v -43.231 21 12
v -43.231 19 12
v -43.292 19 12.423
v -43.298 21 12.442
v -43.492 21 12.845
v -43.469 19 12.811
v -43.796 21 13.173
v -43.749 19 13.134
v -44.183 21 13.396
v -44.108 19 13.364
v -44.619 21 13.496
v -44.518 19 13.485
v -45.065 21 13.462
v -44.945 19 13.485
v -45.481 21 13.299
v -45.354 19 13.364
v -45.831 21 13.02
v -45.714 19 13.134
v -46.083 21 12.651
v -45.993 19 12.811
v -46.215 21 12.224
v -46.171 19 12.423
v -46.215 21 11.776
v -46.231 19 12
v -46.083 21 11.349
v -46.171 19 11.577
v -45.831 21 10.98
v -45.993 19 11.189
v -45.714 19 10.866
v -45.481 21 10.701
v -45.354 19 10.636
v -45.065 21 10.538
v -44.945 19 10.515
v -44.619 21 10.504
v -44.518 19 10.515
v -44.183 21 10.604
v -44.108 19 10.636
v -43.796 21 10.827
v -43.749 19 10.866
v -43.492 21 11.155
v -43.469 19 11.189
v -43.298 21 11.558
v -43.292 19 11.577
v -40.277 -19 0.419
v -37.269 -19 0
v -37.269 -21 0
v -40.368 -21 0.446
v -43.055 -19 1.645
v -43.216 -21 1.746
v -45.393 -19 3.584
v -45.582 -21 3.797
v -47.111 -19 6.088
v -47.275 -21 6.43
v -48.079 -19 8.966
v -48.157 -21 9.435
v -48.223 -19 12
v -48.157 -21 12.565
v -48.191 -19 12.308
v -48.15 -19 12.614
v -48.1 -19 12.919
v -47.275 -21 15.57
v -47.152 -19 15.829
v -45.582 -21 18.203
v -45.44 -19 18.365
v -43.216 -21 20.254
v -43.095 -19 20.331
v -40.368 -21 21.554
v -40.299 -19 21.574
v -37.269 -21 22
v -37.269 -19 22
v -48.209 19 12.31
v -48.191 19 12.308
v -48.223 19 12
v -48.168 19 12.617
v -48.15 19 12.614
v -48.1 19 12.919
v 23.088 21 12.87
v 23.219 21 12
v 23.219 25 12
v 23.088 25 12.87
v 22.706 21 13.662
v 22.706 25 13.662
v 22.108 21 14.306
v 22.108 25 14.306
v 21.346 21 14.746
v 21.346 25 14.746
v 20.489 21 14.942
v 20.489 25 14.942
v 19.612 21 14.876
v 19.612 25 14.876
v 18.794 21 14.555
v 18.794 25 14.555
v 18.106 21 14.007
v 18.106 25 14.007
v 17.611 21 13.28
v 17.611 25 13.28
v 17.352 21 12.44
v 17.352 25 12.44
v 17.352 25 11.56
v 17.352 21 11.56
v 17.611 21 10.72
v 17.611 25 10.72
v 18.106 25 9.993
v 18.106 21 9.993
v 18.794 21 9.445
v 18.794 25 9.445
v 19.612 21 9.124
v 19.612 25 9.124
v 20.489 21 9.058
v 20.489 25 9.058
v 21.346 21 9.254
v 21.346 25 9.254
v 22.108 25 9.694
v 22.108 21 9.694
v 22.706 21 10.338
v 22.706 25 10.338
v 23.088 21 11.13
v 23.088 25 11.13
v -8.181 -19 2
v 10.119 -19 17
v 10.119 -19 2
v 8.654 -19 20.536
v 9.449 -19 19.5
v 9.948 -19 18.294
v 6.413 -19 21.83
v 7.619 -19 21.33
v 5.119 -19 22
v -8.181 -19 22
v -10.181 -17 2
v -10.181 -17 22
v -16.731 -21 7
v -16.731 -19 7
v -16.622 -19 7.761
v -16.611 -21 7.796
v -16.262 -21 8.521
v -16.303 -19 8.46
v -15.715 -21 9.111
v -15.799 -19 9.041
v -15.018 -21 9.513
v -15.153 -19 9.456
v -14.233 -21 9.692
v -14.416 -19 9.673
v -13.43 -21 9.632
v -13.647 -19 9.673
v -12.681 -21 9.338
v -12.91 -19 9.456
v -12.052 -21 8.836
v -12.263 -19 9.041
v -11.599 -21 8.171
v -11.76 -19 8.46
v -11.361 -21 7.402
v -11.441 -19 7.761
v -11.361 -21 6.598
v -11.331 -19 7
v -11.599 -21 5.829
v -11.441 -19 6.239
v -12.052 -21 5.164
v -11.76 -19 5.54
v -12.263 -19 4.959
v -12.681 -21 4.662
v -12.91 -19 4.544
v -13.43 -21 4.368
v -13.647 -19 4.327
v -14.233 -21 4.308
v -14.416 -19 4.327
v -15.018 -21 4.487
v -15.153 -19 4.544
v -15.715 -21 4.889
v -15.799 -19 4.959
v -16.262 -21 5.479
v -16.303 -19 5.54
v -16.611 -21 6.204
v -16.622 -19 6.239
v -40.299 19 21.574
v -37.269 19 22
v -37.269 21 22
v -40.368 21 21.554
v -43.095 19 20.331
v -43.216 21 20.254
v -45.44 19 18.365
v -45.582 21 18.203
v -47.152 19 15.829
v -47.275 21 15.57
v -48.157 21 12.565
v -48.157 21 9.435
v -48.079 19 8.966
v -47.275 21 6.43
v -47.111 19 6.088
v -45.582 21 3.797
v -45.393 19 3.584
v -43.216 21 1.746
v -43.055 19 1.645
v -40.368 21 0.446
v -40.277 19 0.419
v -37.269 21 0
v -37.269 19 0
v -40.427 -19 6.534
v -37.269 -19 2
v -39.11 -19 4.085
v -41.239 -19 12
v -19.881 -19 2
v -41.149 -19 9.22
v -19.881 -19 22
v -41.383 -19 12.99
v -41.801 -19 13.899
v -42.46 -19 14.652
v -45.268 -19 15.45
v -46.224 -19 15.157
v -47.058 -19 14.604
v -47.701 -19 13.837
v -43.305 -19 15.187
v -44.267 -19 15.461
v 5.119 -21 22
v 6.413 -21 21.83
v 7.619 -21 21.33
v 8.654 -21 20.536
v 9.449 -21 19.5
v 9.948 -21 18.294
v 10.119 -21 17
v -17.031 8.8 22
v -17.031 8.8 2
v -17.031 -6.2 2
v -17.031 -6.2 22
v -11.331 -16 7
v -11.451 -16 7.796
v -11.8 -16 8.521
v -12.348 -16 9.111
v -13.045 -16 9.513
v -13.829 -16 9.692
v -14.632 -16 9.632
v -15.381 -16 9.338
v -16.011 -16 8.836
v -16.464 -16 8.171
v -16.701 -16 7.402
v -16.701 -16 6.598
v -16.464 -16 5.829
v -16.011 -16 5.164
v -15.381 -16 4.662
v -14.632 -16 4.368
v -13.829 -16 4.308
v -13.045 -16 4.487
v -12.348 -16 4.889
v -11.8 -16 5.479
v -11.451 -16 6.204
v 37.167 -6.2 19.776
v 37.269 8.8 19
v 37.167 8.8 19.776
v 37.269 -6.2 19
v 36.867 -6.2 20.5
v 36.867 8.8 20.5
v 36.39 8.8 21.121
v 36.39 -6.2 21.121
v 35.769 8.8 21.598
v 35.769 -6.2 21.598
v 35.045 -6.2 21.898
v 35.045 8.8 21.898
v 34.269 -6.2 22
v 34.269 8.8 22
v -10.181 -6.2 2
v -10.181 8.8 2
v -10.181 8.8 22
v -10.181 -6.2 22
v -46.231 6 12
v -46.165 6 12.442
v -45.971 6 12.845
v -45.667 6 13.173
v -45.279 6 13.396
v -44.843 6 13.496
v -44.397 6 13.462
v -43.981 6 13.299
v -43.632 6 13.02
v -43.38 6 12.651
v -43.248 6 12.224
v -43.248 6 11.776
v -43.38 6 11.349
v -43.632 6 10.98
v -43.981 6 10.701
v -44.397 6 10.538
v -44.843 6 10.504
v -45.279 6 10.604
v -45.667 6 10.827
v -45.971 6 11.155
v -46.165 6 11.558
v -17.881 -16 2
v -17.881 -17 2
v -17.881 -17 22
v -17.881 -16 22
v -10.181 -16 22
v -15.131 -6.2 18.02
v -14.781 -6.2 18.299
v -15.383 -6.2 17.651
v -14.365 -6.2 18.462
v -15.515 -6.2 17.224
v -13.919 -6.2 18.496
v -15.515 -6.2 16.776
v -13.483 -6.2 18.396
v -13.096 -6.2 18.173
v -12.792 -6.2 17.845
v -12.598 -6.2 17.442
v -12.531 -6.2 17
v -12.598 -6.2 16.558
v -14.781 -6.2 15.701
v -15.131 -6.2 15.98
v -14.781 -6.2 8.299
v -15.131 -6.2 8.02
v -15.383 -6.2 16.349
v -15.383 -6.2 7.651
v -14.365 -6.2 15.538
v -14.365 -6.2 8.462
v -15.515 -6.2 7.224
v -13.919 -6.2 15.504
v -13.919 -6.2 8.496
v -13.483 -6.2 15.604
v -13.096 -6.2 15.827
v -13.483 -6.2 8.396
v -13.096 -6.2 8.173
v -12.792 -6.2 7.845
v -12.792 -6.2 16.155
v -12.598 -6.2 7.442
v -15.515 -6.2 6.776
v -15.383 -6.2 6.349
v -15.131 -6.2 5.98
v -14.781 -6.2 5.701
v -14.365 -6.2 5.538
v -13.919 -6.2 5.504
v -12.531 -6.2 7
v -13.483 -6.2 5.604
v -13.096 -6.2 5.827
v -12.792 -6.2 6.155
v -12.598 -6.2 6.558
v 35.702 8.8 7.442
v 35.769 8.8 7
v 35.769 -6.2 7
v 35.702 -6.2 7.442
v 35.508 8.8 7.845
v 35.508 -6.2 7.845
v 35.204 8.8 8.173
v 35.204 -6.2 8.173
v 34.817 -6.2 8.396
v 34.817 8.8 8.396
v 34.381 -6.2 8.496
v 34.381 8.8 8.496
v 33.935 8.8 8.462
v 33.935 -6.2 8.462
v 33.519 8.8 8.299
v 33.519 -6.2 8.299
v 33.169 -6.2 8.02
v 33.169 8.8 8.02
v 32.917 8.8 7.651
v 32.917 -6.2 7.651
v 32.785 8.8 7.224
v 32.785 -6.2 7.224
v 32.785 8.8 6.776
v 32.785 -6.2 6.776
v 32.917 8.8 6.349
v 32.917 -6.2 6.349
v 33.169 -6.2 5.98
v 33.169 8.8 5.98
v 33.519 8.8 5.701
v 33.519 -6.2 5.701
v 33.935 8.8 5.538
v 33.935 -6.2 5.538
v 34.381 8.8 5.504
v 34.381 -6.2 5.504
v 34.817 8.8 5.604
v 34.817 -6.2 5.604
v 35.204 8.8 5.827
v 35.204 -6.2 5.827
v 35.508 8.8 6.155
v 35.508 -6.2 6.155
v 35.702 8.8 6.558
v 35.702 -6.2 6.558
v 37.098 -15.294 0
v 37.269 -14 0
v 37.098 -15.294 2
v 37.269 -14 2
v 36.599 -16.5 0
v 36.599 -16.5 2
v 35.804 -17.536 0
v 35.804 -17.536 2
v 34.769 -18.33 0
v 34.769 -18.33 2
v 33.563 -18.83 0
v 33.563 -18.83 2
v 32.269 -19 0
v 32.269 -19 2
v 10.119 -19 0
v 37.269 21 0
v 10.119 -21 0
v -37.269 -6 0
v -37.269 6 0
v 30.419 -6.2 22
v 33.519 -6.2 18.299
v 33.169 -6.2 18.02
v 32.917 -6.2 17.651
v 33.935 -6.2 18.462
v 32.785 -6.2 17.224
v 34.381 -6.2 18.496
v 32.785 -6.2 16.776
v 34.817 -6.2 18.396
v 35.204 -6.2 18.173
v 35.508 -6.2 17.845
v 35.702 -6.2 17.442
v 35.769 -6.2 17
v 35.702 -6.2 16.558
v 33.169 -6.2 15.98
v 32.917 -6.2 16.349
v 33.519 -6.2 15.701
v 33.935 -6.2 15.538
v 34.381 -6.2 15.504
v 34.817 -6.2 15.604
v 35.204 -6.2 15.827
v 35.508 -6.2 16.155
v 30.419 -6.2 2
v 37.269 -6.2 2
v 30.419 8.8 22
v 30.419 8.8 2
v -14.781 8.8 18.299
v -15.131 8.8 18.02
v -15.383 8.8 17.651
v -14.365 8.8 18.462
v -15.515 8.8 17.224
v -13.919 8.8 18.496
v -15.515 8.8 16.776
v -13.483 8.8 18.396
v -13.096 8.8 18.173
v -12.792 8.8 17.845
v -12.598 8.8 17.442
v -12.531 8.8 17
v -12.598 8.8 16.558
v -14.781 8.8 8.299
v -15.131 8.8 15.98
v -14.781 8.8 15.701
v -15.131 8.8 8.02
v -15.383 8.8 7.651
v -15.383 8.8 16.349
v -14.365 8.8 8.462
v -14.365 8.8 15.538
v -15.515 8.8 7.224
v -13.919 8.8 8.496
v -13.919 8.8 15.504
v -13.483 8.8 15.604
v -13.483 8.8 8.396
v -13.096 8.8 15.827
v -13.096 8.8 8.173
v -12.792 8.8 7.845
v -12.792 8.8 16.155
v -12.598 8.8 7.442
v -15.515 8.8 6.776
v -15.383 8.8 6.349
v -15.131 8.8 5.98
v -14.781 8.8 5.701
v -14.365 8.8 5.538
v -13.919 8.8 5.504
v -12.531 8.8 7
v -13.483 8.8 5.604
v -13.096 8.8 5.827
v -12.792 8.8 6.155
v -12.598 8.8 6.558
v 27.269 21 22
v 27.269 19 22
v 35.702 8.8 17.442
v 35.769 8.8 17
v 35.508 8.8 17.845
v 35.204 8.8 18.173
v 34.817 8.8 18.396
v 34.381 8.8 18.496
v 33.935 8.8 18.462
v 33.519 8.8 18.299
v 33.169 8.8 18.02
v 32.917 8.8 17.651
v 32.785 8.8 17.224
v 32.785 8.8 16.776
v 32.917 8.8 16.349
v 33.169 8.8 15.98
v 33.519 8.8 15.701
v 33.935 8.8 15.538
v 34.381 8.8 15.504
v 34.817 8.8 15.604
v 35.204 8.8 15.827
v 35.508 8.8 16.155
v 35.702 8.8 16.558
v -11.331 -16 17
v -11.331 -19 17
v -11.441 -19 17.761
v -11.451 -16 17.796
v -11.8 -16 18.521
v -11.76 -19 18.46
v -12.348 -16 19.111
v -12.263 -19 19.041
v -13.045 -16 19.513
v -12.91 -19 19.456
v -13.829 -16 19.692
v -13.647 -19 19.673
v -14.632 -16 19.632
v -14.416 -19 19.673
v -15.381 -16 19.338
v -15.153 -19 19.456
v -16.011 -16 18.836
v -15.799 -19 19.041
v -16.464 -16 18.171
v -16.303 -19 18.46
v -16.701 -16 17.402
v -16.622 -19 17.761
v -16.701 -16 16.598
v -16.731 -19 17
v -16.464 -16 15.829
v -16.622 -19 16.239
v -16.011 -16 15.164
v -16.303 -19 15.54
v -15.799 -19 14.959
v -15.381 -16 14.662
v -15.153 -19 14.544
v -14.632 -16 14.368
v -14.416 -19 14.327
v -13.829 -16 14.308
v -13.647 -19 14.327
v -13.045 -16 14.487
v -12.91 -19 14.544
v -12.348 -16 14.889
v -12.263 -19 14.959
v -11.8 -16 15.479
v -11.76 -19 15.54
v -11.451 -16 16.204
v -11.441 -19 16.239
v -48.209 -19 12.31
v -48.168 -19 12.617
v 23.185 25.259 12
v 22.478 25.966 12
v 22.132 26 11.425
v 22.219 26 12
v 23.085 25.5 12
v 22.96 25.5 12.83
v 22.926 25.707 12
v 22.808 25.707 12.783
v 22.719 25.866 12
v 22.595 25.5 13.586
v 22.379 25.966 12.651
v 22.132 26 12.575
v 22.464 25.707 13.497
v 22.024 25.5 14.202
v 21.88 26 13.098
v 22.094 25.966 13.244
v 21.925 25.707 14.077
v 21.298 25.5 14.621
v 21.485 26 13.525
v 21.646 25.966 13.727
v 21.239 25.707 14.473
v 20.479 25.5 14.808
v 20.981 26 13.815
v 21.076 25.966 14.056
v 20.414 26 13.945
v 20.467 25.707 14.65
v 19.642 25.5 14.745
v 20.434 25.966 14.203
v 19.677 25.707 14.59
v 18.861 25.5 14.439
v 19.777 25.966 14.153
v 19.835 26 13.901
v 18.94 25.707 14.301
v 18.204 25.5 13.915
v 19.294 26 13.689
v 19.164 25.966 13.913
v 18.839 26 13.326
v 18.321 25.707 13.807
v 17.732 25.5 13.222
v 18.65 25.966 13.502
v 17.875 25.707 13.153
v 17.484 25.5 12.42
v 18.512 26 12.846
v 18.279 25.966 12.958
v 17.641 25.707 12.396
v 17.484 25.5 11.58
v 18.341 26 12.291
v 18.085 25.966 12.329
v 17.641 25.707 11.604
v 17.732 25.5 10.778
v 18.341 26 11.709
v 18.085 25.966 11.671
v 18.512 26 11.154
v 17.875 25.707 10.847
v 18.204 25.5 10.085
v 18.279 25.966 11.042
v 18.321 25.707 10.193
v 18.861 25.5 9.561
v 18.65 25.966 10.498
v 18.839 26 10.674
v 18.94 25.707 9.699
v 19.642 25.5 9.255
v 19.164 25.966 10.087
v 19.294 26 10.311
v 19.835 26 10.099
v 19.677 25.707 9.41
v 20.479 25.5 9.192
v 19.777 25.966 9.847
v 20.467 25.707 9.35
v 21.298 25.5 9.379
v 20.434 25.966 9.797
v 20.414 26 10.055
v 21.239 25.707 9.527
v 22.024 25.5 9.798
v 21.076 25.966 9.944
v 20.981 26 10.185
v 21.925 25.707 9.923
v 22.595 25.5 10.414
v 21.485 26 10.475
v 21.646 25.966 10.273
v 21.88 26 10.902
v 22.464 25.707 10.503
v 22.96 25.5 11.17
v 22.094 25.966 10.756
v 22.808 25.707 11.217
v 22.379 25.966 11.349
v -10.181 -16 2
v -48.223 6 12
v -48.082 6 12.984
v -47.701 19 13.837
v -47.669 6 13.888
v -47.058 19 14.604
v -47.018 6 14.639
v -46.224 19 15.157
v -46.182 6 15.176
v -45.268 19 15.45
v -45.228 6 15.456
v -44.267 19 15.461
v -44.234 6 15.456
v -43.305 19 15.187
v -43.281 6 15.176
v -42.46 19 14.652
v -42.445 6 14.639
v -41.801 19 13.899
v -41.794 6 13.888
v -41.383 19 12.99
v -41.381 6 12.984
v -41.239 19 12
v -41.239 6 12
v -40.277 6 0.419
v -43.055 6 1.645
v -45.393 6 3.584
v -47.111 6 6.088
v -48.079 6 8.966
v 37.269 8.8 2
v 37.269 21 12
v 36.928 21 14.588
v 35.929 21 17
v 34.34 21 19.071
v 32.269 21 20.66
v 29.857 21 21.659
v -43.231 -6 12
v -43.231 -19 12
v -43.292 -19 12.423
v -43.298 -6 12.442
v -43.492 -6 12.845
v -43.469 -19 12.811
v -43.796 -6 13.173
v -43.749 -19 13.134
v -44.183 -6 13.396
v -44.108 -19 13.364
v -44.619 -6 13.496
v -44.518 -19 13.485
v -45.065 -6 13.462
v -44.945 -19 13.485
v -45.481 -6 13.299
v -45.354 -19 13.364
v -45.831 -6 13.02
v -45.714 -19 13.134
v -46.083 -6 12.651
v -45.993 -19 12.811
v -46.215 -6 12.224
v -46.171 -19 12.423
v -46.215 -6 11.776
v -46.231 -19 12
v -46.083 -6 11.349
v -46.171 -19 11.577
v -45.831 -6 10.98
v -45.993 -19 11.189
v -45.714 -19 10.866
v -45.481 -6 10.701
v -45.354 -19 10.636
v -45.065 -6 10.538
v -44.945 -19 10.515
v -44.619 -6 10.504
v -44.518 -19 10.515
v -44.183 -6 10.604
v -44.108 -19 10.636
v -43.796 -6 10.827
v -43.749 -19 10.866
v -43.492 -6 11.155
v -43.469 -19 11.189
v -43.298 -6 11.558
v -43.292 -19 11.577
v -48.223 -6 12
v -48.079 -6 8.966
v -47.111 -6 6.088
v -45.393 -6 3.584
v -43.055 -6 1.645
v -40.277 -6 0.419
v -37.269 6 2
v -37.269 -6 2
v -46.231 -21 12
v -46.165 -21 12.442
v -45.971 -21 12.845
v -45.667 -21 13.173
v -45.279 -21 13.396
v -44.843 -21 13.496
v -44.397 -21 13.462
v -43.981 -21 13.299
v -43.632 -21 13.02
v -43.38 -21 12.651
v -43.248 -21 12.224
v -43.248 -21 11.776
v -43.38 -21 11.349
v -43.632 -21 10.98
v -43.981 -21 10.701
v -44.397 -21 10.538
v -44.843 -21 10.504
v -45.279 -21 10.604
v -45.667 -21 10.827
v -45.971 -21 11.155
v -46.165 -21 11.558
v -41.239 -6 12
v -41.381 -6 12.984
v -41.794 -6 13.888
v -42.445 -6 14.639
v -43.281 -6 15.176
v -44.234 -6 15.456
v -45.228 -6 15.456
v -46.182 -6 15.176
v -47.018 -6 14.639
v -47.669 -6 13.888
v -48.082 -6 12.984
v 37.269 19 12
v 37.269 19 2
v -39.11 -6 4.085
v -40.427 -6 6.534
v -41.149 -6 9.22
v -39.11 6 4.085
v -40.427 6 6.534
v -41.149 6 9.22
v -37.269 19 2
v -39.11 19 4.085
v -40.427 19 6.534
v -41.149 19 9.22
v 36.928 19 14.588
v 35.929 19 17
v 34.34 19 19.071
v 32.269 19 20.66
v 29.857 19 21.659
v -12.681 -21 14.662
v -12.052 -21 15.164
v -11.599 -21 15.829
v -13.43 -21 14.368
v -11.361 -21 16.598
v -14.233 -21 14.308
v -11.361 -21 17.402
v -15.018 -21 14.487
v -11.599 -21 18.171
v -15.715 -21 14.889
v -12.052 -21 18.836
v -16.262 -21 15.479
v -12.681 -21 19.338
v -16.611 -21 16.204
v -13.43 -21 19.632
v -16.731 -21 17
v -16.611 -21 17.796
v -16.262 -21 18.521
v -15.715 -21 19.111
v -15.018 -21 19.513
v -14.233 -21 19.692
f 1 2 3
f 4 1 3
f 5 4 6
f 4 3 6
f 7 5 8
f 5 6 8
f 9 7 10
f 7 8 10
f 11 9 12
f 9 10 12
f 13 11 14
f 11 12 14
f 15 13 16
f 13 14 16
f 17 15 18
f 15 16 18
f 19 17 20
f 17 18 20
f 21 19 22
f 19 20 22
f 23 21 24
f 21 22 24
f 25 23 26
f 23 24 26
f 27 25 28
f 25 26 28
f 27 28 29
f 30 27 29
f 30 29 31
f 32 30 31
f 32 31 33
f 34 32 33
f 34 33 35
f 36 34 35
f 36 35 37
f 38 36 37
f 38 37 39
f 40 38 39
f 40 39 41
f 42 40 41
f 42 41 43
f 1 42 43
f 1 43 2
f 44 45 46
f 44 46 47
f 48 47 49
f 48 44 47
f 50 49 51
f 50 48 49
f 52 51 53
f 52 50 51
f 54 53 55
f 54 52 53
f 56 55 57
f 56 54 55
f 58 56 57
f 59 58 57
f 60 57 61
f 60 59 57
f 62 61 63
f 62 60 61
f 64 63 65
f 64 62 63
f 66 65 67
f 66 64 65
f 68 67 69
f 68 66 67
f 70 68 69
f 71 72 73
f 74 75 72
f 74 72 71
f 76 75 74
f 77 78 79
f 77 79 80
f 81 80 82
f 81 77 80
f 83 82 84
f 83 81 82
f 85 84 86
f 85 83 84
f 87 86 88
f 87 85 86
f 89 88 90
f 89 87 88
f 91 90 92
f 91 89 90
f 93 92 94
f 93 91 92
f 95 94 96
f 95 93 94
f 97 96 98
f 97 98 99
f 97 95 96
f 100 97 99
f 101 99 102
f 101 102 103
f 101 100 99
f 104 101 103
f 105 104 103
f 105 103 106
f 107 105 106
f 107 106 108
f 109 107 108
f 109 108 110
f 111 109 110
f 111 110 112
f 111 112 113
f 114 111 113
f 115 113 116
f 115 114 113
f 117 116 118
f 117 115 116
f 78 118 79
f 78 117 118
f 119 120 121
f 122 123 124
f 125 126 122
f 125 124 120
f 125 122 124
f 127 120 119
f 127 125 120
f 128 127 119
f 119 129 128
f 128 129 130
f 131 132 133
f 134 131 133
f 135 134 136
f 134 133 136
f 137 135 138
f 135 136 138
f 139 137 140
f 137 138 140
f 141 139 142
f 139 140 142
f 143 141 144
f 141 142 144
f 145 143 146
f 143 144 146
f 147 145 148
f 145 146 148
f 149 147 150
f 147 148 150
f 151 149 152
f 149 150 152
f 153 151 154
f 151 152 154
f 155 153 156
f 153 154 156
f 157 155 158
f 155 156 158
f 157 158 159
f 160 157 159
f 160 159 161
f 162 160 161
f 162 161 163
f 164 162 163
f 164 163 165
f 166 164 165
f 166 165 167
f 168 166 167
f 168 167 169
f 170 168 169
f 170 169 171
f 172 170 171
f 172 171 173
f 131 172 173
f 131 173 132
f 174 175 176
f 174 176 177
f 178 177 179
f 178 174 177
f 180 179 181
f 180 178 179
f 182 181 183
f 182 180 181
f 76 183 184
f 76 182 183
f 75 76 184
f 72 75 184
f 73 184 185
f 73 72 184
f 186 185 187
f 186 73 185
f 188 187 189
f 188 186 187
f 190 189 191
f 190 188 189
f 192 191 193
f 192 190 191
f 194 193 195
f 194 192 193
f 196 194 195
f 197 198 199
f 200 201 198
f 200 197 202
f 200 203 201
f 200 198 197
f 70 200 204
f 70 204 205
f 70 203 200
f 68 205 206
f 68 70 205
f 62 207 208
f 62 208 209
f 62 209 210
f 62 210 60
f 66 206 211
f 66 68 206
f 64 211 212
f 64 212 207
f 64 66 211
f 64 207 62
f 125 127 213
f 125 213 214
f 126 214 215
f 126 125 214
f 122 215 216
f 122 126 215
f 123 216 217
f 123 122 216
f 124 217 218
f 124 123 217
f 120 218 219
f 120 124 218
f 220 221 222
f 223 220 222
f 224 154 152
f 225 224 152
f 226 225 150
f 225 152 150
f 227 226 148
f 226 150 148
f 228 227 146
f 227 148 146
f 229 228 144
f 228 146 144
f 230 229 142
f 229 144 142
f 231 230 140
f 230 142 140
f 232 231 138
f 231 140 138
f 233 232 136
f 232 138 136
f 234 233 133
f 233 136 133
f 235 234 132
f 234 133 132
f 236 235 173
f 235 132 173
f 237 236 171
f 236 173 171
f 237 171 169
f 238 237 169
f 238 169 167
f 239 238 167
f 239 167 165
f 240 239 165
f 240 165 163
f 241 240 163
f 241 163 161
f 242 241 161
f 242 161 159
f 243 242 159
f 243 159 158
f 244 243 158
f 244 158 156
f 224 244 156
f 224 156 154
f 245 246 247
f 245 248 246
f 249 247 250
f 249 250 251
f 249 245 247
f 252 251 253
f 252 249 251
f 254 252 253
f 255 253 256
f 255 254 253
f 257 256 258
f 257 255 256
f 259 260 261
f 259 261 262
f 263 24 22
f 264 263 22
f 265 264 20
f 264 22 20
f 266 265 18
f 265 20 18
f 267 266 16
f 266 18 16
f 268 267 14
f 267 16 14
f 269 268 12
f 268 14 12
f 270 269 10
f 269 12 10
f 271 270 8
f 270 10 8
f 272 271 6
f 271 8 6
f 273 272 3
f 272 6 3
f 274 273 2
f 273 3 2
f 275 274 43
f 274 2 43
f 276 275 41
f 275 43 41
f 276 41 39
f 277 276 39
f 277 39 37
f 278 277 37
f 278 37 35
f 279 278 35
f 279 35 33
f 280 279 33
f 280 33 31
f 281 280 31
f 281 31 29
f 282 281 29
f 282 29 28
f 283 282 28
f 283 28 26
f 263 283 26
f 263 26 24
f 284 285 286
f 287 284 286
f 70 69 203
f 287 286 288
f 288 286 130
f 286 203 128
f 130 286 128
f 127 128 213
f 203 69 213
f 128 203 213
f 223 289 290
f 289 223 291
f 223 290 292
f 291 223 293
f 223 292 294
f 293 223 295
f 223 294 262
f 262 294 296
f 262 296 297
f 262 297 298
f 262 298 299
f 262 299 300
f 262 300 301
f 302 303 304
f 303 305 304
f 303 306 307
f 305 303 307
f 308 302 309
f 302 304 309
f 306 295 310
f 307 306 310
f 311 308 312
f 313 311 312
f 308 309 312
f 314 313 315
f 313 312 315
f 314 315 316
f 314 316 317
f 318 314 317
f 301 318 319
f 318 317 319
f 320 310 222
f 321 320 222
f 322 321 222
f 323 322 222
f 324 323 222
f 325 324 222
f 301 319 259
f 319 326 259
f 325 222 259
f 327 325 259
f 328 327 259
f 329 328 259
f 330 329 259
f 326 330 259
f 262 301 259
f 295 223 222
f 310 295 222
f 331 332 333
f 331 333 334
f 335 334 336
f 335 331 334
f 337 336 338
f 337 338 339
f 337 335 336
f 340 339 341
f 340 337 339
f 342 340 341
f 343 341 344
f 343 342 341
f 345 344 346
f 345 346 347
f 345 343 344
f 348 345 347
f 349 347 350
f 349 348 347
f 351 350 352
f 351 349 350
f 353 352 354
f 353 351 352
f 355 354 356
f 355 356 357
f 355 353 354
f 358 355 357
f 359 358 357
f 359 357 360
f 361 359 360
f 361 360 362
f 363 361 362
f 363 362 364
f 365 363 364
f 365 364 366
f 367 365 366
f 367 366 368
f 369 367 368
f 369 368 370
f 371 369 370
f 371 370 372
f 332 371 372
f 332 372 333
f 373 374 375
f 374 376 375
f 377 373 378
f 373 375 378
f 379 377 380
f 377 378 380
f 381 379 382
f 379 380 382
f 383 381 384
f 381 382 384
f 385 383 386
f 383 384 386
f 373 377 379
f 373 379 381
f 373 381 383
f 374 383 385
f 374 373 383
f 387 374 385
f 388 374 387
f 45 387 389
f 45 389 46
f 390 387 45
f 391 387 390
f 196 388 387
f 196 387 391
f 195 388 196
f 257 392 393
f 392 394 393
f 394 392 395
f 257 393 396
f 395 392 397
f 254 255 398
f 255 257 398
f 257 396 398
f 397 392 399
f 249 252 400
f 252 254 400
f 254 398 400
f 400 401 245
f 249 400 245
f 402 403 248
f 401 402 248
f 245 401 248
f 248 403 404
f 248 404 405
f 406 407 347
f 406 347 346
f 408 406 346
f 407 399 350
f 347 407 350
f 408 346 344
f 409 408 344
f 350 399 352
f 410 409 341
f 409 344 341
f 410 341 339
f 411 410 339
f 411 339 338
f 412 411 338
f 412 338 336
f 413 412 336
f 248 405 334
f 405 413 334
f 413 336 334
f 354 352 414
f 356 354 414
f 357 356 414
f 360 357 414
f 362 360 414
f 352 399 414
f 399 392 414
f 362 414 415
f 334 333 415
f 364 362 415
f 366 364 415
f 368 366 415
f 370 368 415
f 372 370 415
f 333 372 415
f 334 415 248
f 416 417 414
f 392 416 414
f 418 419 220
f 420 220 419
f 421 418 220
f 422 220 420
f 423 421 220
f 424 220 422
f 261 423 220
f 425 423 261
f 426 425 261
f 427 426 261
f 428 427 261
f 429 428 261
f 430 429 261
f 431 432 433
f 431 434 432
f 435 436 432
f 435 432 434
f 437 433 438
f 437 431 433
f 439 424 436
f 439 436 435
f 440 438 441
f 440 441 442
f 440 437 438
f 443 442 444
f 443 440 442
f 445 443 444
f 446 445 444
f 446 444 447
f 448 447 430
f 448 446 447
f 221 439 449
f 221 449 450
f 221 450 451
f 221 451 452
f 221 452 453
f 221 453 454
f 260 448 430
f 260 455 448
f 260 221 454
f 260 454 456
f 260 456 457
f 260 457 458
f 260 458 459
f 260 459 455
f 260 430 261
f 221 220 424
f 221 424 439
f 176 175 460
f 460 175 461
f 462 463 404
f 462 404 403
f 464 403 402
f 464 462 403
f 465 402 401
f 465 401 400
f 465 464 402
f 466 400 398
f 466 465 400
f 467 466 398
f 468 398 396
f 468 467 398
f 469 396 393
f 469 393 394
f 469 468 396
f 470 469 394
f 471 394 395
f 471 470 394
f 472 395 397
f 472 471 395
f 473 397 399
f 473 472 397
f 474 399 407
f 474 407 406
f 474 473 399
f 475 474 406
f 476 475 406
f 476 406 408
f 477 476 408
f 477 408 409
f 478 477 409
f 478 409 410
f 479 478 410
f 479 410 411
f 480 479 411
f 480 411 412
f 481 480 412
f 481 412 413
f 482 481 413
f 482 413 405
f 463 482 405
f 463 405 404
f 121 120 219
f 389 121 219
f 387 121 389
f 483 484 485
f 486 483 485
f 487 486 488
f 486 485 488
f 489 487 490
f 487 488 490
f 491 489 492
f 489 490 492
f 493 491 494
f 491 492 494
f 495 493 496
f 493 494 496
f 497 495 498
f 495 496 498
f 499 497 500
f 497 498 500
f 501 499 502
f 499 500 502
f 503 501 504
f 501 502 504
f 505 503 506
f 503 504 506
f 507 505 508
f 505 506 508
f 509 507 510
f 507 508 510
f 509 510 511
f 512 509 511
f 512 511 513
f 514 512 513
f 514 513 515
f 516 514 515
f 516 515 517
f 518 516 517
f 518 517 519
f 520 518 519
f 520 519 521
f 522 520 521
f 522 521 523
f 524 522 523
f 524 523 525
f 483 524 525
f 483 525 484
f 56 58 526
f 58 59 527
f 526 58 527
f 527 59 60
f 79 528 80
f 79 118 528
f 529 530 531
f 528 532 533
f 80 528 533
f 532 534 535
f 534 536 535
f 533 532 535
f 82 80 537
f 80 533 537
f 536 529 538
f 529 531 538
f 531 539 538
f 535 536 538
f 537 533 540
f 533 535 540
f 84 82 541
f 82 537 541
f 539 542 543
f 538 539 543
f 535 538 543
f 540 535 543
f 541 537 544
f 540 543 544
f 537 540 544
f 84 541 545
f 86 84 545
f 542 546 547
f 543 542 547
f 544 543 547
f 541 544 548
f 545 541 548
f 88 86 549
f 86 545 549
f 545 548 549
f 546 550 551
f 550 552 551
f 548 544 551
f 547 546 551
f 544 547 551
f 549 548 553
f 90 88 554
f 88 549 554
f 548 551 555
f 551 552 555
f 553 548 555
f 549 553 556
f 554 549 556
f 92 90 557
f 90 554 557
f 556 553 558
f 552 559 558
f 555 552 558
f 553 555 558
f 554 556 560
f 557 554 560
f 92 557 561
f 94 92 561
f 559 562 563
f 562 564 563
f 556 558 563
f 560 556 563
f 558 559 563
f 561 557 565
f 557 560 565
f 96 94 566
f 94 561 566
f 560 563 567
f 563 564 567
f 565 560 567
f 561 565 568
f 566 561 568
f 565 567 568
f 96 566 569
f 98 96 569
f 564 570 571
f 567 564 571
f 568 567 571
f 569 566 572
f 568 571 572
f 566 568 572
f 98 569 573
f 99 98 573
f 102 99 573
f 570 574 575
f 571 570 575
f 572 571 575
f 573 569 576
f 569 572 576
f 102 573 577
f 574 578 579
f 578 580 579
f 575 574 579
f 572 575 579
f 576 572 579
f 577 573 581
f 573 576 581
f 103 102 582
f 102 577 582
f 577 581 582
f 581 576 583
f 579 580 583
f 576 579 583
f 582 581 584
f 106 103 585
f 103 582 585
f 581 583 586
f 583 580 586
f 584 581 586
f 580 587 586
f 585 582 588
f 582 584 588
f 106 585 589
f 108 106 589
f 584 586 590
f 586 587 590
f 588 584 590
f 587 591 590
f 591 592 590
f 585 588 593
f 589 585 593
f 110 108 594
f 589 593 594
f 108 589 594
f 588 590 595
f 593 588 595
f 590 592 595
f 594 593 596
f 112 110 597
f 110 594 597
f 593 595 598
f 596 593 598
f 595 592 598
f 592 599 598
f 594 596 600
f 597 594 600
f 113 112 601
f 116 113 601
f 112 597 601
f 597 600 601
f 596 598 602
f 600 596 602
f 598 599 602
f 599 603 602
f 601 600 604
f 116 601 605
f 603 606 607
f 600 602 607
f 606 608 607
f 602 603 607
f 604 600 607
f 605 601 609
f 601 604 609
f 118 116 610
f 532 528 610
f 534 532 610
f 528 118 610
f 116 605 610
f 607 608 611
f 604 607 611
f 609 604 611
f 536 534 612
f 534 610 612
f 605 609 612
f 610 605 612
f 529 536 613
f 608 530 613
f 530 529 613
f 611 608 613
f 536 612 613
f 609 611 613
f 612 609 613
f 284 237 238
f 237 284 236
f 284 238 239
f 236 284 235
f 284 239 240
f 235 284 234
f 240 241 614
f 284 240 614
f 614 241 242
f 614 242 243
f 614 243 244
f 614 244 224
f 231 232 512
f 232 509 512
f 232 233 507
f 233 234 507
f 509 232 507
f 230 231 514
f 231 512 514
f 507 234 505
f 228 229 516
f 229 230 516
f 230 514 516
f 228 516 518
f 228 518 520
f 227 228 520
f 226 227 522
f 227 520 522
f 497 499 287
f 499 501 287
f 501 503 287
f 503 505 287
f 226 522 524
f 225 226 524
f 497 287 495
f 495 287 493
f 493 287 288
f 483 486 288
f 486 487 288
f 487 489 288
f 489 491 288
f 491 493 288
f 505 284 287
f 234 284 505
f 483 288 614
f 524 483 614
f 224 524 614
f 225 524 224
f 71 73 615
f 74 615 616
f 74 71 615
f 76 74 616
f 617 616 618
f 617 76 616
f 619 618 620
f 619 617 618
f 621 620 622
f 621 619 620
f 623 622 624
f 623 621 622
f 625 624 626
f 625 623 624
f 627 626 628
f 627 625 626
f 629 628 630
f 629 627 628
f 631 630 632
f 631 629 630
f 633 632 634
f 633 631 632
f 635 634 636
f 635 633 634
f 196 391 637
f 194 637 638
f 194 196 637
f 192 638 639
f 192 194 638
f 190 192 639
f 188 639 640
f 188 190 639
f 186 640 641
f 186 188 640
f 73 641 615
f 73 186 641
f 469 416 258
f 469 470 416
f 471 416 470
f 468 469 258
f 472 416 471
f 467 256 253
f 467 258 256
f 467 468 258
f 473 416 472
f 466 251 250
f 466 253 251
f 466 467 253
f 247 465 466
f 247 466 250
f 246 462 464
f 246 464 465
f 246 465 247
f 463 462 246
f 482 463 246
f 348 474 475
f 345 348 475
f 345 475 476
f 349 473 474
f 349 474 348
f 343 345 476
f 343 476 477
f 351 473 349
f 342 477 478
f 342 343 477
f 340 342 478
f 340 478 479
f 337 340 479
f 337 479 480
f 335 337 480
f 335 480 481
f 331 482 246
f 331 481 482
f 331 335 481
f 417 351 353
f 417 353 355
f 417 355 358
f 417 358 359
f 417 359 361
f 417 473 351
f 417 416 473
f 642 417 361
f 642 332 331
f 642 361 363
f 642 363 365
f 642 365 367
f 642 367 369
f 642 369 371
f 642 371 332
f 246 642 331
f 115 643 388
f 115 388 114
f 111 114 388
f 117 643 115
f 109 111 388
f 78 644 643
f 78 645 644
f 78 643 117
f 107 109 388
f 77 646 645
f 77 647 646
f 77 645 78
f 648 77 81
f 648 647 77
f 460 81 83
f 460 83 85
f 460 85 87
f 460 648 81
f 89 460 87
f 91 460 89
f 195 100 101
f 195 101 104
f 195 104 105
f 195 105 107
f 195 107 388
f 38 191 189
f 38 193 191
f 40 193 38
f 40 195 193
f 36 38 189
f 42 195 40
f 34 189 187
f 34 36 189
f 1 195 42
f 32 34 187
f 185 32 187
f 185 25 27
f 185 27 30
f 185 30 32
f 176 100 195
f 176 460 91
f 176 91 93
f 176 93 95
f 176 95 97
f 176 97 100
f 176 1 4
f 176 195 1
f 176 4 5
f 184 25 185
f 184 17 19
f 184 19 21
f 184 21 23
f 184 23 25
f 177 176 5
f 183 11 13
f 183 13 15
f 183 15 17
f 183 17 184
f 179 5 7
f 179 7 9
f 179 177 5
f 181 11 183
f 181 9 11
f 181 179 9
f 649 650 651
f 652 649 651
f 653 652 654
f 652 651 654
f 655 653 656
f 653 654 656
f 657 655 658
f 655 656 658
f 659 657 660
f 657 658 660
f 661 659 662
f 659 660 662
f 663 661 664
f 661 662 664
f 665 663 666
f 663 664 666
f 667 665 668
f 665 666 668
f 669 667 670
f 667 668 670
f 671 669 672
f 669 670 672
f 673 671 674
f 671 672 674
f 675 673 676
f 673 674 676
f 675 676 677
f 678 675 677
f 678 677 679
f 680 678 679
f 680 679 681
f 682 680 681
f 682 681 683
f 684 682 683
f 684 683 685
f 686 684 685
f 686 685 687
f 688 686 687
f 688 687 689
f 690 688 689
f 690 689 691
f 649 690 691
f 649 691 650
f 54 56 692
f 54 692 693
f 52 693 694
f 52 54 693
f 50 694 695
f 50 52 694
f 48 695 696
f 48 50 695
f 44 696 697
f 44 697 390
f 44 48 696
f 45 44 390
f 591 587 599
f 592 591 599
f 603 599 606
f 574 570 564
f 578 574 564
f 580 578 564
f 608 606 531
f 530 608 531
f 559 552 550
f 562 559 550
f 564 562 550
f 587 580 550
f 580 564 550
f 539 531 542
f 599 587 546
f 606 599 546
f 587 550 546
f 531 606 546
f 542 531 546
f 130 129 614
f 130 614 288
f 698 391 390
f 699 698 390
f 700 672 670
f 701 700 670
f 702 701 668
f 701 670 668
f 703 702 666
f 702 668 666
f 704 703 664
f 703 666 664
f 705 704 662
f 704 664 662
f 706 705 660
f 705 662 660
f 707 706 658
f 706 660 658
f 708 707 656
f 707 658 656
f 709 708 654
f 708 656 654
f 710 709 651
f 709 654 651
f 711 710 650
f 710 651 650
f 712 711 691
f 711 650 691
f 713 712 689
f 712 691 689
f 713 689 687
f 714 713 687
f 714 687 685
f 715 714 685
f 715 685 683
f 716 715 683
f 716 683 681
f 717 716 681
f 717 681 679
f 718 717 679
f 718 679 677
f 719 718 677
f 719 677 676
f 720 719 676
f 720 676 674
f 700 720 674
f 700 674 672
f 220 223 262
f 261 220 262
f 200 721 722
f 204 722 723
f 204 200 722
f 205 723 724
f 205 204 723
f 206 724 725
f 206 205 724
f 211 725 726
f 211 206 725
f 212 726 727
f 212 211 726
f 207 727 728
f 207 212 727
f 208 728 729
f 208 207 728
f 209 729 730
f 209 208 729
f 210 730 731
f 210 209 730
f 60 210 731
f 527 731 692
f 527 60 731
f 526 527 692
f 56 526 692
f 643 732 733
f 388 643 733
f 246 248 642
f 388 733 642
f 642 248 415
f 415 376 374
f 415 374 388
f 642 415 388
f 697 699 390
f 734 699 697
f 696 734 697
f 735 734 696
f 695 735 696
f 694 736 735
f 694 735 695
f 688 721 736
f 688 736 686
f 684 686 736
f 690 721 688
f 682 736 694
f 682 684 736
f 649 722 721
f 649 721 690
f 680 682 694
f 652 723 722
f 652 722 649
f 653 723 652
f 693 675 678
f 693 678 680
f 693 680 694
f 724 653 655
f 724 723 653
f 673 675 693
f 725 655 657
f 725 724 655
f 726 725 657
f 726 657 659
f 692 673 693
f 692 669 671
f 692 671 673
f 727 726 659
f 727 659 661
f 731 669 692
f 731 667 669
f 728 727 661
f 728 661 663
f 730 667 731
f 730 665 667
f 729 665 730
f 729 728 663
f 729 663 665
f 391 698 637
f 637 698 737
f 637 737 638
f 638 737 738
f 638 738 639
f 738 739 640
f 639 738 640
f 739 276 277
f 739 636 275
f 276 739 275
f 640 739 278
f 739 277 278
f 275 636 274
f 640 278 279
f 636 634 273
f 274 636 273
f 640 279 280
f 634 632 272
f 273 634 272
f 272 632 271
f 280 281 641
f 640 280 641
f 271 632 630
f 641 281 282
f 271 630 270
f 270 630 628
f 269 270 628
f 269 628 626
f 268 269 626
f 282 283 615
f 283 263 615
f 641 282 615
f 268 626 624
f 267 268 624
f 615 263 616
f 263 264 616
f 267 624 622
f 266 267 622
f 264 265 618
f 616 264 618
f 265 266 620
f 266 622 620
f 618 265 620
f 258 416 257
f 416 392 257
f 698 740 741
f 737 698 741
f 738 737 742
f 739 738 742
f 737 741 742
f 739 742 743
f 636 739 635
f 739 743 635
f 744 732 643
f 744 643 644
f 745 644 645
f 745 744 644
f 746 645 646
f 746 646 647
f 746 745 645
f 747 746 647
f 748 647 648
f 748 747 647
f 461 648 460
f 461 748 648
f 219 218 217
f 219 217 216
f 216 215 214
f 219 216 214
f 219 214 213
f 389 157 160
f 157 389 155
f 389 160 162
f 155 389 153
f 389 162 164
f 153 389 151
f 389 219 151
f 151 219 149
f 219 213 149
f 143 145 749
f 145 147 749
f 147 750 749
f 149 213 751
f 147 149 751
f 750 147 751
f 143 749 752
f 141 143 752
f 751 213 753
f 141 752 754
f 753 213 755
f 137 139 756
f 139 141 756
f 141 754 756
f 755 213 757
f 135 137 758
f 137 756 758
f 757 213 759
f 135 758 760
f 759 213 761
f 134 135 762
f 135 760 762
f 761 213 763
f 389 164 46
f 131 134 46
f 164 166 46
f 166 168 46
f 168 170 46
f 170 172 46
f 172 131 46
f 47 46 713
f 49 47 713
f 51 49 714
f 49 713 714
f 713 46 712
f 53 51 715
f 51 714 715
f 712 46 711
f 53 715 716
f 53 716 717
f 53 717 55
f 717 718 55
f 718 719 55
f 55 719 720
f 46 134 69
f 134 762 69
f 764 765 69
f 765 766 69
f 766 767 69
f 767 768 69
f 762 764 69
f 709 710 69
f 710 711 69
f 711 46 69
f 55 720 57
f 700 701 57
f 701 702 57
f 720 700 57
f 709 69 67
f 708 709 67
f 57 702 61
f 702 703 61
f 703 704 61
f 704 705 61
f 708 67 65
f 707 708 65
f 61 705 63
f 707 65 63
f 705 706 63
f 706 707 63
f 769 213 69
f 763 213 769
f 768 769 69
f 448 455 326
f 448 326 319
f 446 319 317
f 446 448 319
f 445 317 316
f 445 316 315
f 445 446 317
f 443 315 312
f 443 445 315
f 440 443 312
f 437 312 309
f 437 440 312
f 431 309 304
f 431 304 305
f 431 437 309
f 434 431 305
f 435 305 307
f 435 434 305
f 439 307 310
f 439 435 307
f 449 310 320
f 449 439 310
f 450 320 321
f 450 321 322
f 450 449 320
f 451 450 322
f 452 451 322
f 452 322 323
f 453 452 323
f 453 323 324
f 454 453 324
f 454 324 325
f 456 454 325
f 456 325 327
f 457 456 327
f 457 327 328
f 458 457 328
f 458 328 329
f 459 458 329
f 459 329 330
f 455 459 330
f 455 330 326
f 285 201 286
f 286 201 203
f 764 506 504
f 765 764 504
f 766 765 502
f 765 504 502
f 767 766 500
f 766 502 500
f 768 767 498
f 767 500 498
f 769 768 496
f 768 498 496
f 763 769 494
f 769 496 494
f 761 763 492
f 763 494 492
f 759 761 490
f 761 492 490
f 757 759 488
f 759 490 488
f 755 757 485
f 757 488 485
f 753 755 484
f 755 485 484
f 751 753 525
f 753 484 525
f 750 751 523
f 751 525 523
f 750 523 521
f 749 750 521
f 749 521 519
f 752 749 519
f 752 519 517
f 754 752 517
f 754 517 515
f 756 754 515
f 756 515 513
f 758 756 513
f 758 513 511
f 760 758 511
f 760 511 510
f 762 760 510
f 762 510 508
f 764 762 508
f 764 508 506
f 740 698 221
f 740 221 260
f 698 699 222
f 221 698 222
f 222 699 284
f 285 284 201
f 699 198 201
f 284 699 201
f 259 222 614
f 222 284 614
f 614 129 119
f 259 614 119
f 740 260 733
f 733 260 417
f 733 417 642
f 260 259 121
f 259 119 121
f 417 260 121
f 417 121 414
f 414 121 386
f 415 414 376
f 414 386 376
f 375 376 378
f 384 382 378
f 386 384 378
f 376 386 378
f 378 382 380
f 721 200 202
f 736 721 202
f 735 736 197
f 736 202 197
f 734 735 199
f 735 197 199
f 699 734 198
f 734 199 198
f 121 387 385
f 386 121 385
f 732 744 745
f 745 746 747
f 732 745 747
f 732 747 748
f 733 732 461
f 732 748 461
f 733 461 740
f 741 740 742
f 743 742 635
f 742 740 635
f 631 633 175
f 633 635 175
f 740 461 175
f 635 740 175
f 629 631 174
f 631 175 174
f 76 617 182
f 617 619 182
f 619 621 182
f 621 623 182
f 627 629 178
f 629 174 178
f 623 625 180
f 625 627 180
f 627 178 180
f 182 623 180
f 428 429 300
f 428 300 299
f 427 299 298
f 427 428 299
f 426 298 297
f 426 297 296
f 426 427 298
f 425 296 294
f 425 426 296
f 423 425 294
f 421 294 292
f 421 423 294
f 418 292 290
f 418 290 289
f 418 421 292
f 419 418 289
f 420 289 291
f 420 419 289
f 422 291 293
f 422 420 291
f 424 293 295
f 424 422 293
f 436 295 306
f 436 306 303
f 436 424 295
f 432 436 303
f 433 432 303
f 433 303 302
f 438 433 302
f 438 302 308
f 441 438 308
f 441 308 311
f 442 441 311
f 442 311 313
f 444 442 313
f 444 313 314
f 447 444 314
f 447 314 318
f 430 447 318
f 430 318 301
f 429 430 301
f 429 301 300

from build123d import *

# Parameters (mm, degrees)
SKETCH_W        = 74.53746
SKETCH_H        = 38
PAD_DEPTH       = 2
SKETCH001_W     = 6.85
SKETCH001_H     = 15
PAD001_DEPTH    = 20
SKETCH002_R     = 1.5
POCKET_DEPTH    = 17
SKETCH003_R     = 1.5
PAD002_DEPTH    = 2
SKETCH004_R     = 2.95
PAD003_DEPTH    = 5
SKETCH005_R     = 2.7
SKETCH005_R_2   = 1.5
PAD004_DEPTH    = 2
SKETCH006_W     = 7.7
SKETCH006_H     = 20
SKETCH006_R     = 2.7
PAD005_DEPTH    = 3
SKETCH007_R     = 1.5
PAD006_DEPTH    = 13
SKETCH008_R     = 1.5
PAD007_DEPTH    = 13
FILLET_R        = 3
FILLET001_R     = 5
FILLET002_R     = 1
CHAMFER_SIZE    = 2
CHAMFER001_SIZE = 2


with BuildPart() as body:
    # Sketch → Pad (new body)
    with BuildSketch(Plane.XY):
        Rectangle(SKETCH_W, SKETCH_H)
    extrude(amount=PAD_DEPTH)

    # Sketch001 (on Face6 of Pad) → Pad001 (join)
    with BuildSketch(Plane.XY.offset(2)):
        with Locations((33.84373, -1.3)):
            Rectangle(SKETCH001_W, SKETCH001_H)
        with Locations((-13.60627, -1.3)):
            Rectangle(SKETCH001_W, SKETCH001_H)
    extrude(amount=PAD001_DEPTH)

    # Sketch002 (on Face12 of Pad001) → Pocket (cut)
    with BuildSketch(Plane.XZ.offset(8.8)):
        with Locations((-14.03127, 17)):
            Circle(SKETCH002_R)
        with Locations((-14.03127, 7)):
            Circle(SKETCH002_R)
        with Locations((34.26873, 17)):
            Circle(SKETCH002_R)
        with Locations((34.26873, 7)):
            Circle(SKETCH002_R)
    extrude(amount=-POCKET_DEPTH, mode=Mode.SUBTRACT)

    # Sketch003 (on Face6 of Pocket) → Pad002 (join)
    with BuildSketch(Plane.XZ.offset(19)):
        with BuildLine():
            Line((37.26873, 0), (-37.26873, 0))
            ThreePointArc((-37.26873, 22), (-48.26873, 11), (-37.26873, 0))
            Line((-37.26873, 22), (27.26873, 22))
            ThreePointArc((37.26873, 12), (34.339798, 19.071068), (27.26873, 22))
            Line((37.26873, 12), (37.26873, 0))
        make_face()
        with Locations((-44.73127, 12)):
            Circle(SKETCH003_R, mode=Mode.SUBTRACT)
    extrude(amount=PAD002_DEPTH)

    # Sketch004 (on Face21 of Pad002) → Pad003 (join)
    with BuildSketch(Plane.XZ.offset(21)):
        with Locations((20.26873, 12)):
            Circle(SKETCH004_R)
    extrude(amount=PAD003_DEPTH)

    # Sketch005 (on Face1 of Pad003) → Pad004 (join)
    with BuildSketch(Plane(origin=(0, 19, 0), x_dir=(-1, 0, 0), z_dir=(0, 1, 0))):
        with BuildLine():
            Line((37.26873, 22), (-5.11873, 22))
            ThreePointArc((-5.11873, 22), (-8.654264, 20.535534), (-10.11873, 17))
            Line((-10.11873, 17), (-10.11873, 0))
            Line((-10.11873, 0), (37.26873, 0))
            ThreePointArc((37.26873, 0), (48.26873, 11), (37.26873, 22))
        make_face()
        with Locations((14.03127, 17)):
            Circle(SKETCH005_R, mode=Mode.SUBTRACT)
        with Locations((14.03127, 7)):
            Circle(SKETCH005_R, mode=Mode.SUBTRACT)
        with Locations((44.73127, 12)):
            Circle(SKETCH005_R_2, mode=Mode.SUBTRACT)
    extrude(amount=PAD004_DEPTH)

    # Sketch006 (on Face11 of Pad004) → Pad005 (join)
    with BuildSketch(Plane.XZ.offset(-19)):
        with Locations((-14.03127, 12)):
            Rectangle(SKETCH006_W, SKETCH006_H)
        with Locations((-14.03127, 7)):
            Circle(SKETCH006_R, mode=Mode.SUBTRACT)
        with Locations((-14.03127, 17)):
            Circle(SKETCH006_R, mode=Mode.SUBTRACT)
    extrude(amount=PAD005_DEPTH)

    # Sketch007 (on Face11 of Pad005) → Pad006 (join)
    with BuildSketch(Plane.XZ.offset(-19)):
        with BuildLine():
            ThreePointArc((-41.239359, 12.000001), (-40.426624, 6.534413), (-37.26873, 2))
            Line((-37.26873, 2), (-37.26873, 0))
            ThreePointArc((-48.223181, 11.999999), (-45.392768, 3.583801), (-37.26873, 0))
            ThreePointArc((-41.239359, 12.000001), (-44.731271, 15.491911), (-48.223181, 11.999999))
        make_face()
        with Locations((-44.73127, 12)):
            Circle(SKETCH007_R, mode=Mode.SUBTRACT)
    extrude(amount=PAD006_DEPTH)

    # Sketch008 (on Face20 of Pad006) → Pad007 (join)
    with BuildSketch(Plane(origin=(0, -19, 0), x_dir=(-1, 0, 0), z_dir=(0, 1, 0))):
        with BuildLine():
            Line((37.26873, 2), (37.26873, 0))
            ThreePointArc((37.26873, 0), (45.392768, 3.583802), (48.223181, 12))
            ThreePointArc((48.223181, 12), (44.73127, 15.491911), (41.239359, 12))
            ThreePointArc((37.26873, 2), (40.426624, 6.534412), (41.239359, 12))
        make_face()
        with Locations((44.73127, 12)):
            Circle(SKETCH008_R, mode=Mode.SUBTRACT)
    extrude(amount=PAD007_DEPTH)

    # Fillet
    fillet_edges = [body.edges().sort_by_distance(p)[0] for p in [
        (37.26873, -1.3, 22),
    ]]
    fillet(fillet_edges, radius=FILLET_R)

    # Fillet001
    fillet001_edges = [body.edges().sort_by_distance(p)[0] for p in [
        (37.26873, 19, 1),
    ]]
    fillet(fillet001_edges, radius=FILLET001_R)

    # Fillet002
    fillet002_edges = [body.edges().sort_by_distance(p)[0] for p in [
        (17.31873, -26, 12),
    ]]
    fillet(fillet002_edges, radius=FILLET002_R)

    # Chamfer
    chamfer_edges = [body.edges().sort_by_distance(p)[0] for p in [
        (-10.18127, 19, 12),
    ]]
    chamfer(chamfer_edges, length=CHAMFER_SIZE)

    # Chamfer001
    chamfer001_edges = [body.edges().sort_by_distance(p)[0] for p in [
        (-17.88127, 19, 12),
    ]]
    chamfer(chamfer001_edges, length=CHAMFER001_SIZE)


with BuildPart() as part_mirroring:
    # Part__Mirroring: instance of Body
    add(body.part.mirror(Plane(origin=(0, 0, 0), x_dir=(1, 0, 0), z_dir=(0, 1, 0))))


solid = part_mirroring.part
